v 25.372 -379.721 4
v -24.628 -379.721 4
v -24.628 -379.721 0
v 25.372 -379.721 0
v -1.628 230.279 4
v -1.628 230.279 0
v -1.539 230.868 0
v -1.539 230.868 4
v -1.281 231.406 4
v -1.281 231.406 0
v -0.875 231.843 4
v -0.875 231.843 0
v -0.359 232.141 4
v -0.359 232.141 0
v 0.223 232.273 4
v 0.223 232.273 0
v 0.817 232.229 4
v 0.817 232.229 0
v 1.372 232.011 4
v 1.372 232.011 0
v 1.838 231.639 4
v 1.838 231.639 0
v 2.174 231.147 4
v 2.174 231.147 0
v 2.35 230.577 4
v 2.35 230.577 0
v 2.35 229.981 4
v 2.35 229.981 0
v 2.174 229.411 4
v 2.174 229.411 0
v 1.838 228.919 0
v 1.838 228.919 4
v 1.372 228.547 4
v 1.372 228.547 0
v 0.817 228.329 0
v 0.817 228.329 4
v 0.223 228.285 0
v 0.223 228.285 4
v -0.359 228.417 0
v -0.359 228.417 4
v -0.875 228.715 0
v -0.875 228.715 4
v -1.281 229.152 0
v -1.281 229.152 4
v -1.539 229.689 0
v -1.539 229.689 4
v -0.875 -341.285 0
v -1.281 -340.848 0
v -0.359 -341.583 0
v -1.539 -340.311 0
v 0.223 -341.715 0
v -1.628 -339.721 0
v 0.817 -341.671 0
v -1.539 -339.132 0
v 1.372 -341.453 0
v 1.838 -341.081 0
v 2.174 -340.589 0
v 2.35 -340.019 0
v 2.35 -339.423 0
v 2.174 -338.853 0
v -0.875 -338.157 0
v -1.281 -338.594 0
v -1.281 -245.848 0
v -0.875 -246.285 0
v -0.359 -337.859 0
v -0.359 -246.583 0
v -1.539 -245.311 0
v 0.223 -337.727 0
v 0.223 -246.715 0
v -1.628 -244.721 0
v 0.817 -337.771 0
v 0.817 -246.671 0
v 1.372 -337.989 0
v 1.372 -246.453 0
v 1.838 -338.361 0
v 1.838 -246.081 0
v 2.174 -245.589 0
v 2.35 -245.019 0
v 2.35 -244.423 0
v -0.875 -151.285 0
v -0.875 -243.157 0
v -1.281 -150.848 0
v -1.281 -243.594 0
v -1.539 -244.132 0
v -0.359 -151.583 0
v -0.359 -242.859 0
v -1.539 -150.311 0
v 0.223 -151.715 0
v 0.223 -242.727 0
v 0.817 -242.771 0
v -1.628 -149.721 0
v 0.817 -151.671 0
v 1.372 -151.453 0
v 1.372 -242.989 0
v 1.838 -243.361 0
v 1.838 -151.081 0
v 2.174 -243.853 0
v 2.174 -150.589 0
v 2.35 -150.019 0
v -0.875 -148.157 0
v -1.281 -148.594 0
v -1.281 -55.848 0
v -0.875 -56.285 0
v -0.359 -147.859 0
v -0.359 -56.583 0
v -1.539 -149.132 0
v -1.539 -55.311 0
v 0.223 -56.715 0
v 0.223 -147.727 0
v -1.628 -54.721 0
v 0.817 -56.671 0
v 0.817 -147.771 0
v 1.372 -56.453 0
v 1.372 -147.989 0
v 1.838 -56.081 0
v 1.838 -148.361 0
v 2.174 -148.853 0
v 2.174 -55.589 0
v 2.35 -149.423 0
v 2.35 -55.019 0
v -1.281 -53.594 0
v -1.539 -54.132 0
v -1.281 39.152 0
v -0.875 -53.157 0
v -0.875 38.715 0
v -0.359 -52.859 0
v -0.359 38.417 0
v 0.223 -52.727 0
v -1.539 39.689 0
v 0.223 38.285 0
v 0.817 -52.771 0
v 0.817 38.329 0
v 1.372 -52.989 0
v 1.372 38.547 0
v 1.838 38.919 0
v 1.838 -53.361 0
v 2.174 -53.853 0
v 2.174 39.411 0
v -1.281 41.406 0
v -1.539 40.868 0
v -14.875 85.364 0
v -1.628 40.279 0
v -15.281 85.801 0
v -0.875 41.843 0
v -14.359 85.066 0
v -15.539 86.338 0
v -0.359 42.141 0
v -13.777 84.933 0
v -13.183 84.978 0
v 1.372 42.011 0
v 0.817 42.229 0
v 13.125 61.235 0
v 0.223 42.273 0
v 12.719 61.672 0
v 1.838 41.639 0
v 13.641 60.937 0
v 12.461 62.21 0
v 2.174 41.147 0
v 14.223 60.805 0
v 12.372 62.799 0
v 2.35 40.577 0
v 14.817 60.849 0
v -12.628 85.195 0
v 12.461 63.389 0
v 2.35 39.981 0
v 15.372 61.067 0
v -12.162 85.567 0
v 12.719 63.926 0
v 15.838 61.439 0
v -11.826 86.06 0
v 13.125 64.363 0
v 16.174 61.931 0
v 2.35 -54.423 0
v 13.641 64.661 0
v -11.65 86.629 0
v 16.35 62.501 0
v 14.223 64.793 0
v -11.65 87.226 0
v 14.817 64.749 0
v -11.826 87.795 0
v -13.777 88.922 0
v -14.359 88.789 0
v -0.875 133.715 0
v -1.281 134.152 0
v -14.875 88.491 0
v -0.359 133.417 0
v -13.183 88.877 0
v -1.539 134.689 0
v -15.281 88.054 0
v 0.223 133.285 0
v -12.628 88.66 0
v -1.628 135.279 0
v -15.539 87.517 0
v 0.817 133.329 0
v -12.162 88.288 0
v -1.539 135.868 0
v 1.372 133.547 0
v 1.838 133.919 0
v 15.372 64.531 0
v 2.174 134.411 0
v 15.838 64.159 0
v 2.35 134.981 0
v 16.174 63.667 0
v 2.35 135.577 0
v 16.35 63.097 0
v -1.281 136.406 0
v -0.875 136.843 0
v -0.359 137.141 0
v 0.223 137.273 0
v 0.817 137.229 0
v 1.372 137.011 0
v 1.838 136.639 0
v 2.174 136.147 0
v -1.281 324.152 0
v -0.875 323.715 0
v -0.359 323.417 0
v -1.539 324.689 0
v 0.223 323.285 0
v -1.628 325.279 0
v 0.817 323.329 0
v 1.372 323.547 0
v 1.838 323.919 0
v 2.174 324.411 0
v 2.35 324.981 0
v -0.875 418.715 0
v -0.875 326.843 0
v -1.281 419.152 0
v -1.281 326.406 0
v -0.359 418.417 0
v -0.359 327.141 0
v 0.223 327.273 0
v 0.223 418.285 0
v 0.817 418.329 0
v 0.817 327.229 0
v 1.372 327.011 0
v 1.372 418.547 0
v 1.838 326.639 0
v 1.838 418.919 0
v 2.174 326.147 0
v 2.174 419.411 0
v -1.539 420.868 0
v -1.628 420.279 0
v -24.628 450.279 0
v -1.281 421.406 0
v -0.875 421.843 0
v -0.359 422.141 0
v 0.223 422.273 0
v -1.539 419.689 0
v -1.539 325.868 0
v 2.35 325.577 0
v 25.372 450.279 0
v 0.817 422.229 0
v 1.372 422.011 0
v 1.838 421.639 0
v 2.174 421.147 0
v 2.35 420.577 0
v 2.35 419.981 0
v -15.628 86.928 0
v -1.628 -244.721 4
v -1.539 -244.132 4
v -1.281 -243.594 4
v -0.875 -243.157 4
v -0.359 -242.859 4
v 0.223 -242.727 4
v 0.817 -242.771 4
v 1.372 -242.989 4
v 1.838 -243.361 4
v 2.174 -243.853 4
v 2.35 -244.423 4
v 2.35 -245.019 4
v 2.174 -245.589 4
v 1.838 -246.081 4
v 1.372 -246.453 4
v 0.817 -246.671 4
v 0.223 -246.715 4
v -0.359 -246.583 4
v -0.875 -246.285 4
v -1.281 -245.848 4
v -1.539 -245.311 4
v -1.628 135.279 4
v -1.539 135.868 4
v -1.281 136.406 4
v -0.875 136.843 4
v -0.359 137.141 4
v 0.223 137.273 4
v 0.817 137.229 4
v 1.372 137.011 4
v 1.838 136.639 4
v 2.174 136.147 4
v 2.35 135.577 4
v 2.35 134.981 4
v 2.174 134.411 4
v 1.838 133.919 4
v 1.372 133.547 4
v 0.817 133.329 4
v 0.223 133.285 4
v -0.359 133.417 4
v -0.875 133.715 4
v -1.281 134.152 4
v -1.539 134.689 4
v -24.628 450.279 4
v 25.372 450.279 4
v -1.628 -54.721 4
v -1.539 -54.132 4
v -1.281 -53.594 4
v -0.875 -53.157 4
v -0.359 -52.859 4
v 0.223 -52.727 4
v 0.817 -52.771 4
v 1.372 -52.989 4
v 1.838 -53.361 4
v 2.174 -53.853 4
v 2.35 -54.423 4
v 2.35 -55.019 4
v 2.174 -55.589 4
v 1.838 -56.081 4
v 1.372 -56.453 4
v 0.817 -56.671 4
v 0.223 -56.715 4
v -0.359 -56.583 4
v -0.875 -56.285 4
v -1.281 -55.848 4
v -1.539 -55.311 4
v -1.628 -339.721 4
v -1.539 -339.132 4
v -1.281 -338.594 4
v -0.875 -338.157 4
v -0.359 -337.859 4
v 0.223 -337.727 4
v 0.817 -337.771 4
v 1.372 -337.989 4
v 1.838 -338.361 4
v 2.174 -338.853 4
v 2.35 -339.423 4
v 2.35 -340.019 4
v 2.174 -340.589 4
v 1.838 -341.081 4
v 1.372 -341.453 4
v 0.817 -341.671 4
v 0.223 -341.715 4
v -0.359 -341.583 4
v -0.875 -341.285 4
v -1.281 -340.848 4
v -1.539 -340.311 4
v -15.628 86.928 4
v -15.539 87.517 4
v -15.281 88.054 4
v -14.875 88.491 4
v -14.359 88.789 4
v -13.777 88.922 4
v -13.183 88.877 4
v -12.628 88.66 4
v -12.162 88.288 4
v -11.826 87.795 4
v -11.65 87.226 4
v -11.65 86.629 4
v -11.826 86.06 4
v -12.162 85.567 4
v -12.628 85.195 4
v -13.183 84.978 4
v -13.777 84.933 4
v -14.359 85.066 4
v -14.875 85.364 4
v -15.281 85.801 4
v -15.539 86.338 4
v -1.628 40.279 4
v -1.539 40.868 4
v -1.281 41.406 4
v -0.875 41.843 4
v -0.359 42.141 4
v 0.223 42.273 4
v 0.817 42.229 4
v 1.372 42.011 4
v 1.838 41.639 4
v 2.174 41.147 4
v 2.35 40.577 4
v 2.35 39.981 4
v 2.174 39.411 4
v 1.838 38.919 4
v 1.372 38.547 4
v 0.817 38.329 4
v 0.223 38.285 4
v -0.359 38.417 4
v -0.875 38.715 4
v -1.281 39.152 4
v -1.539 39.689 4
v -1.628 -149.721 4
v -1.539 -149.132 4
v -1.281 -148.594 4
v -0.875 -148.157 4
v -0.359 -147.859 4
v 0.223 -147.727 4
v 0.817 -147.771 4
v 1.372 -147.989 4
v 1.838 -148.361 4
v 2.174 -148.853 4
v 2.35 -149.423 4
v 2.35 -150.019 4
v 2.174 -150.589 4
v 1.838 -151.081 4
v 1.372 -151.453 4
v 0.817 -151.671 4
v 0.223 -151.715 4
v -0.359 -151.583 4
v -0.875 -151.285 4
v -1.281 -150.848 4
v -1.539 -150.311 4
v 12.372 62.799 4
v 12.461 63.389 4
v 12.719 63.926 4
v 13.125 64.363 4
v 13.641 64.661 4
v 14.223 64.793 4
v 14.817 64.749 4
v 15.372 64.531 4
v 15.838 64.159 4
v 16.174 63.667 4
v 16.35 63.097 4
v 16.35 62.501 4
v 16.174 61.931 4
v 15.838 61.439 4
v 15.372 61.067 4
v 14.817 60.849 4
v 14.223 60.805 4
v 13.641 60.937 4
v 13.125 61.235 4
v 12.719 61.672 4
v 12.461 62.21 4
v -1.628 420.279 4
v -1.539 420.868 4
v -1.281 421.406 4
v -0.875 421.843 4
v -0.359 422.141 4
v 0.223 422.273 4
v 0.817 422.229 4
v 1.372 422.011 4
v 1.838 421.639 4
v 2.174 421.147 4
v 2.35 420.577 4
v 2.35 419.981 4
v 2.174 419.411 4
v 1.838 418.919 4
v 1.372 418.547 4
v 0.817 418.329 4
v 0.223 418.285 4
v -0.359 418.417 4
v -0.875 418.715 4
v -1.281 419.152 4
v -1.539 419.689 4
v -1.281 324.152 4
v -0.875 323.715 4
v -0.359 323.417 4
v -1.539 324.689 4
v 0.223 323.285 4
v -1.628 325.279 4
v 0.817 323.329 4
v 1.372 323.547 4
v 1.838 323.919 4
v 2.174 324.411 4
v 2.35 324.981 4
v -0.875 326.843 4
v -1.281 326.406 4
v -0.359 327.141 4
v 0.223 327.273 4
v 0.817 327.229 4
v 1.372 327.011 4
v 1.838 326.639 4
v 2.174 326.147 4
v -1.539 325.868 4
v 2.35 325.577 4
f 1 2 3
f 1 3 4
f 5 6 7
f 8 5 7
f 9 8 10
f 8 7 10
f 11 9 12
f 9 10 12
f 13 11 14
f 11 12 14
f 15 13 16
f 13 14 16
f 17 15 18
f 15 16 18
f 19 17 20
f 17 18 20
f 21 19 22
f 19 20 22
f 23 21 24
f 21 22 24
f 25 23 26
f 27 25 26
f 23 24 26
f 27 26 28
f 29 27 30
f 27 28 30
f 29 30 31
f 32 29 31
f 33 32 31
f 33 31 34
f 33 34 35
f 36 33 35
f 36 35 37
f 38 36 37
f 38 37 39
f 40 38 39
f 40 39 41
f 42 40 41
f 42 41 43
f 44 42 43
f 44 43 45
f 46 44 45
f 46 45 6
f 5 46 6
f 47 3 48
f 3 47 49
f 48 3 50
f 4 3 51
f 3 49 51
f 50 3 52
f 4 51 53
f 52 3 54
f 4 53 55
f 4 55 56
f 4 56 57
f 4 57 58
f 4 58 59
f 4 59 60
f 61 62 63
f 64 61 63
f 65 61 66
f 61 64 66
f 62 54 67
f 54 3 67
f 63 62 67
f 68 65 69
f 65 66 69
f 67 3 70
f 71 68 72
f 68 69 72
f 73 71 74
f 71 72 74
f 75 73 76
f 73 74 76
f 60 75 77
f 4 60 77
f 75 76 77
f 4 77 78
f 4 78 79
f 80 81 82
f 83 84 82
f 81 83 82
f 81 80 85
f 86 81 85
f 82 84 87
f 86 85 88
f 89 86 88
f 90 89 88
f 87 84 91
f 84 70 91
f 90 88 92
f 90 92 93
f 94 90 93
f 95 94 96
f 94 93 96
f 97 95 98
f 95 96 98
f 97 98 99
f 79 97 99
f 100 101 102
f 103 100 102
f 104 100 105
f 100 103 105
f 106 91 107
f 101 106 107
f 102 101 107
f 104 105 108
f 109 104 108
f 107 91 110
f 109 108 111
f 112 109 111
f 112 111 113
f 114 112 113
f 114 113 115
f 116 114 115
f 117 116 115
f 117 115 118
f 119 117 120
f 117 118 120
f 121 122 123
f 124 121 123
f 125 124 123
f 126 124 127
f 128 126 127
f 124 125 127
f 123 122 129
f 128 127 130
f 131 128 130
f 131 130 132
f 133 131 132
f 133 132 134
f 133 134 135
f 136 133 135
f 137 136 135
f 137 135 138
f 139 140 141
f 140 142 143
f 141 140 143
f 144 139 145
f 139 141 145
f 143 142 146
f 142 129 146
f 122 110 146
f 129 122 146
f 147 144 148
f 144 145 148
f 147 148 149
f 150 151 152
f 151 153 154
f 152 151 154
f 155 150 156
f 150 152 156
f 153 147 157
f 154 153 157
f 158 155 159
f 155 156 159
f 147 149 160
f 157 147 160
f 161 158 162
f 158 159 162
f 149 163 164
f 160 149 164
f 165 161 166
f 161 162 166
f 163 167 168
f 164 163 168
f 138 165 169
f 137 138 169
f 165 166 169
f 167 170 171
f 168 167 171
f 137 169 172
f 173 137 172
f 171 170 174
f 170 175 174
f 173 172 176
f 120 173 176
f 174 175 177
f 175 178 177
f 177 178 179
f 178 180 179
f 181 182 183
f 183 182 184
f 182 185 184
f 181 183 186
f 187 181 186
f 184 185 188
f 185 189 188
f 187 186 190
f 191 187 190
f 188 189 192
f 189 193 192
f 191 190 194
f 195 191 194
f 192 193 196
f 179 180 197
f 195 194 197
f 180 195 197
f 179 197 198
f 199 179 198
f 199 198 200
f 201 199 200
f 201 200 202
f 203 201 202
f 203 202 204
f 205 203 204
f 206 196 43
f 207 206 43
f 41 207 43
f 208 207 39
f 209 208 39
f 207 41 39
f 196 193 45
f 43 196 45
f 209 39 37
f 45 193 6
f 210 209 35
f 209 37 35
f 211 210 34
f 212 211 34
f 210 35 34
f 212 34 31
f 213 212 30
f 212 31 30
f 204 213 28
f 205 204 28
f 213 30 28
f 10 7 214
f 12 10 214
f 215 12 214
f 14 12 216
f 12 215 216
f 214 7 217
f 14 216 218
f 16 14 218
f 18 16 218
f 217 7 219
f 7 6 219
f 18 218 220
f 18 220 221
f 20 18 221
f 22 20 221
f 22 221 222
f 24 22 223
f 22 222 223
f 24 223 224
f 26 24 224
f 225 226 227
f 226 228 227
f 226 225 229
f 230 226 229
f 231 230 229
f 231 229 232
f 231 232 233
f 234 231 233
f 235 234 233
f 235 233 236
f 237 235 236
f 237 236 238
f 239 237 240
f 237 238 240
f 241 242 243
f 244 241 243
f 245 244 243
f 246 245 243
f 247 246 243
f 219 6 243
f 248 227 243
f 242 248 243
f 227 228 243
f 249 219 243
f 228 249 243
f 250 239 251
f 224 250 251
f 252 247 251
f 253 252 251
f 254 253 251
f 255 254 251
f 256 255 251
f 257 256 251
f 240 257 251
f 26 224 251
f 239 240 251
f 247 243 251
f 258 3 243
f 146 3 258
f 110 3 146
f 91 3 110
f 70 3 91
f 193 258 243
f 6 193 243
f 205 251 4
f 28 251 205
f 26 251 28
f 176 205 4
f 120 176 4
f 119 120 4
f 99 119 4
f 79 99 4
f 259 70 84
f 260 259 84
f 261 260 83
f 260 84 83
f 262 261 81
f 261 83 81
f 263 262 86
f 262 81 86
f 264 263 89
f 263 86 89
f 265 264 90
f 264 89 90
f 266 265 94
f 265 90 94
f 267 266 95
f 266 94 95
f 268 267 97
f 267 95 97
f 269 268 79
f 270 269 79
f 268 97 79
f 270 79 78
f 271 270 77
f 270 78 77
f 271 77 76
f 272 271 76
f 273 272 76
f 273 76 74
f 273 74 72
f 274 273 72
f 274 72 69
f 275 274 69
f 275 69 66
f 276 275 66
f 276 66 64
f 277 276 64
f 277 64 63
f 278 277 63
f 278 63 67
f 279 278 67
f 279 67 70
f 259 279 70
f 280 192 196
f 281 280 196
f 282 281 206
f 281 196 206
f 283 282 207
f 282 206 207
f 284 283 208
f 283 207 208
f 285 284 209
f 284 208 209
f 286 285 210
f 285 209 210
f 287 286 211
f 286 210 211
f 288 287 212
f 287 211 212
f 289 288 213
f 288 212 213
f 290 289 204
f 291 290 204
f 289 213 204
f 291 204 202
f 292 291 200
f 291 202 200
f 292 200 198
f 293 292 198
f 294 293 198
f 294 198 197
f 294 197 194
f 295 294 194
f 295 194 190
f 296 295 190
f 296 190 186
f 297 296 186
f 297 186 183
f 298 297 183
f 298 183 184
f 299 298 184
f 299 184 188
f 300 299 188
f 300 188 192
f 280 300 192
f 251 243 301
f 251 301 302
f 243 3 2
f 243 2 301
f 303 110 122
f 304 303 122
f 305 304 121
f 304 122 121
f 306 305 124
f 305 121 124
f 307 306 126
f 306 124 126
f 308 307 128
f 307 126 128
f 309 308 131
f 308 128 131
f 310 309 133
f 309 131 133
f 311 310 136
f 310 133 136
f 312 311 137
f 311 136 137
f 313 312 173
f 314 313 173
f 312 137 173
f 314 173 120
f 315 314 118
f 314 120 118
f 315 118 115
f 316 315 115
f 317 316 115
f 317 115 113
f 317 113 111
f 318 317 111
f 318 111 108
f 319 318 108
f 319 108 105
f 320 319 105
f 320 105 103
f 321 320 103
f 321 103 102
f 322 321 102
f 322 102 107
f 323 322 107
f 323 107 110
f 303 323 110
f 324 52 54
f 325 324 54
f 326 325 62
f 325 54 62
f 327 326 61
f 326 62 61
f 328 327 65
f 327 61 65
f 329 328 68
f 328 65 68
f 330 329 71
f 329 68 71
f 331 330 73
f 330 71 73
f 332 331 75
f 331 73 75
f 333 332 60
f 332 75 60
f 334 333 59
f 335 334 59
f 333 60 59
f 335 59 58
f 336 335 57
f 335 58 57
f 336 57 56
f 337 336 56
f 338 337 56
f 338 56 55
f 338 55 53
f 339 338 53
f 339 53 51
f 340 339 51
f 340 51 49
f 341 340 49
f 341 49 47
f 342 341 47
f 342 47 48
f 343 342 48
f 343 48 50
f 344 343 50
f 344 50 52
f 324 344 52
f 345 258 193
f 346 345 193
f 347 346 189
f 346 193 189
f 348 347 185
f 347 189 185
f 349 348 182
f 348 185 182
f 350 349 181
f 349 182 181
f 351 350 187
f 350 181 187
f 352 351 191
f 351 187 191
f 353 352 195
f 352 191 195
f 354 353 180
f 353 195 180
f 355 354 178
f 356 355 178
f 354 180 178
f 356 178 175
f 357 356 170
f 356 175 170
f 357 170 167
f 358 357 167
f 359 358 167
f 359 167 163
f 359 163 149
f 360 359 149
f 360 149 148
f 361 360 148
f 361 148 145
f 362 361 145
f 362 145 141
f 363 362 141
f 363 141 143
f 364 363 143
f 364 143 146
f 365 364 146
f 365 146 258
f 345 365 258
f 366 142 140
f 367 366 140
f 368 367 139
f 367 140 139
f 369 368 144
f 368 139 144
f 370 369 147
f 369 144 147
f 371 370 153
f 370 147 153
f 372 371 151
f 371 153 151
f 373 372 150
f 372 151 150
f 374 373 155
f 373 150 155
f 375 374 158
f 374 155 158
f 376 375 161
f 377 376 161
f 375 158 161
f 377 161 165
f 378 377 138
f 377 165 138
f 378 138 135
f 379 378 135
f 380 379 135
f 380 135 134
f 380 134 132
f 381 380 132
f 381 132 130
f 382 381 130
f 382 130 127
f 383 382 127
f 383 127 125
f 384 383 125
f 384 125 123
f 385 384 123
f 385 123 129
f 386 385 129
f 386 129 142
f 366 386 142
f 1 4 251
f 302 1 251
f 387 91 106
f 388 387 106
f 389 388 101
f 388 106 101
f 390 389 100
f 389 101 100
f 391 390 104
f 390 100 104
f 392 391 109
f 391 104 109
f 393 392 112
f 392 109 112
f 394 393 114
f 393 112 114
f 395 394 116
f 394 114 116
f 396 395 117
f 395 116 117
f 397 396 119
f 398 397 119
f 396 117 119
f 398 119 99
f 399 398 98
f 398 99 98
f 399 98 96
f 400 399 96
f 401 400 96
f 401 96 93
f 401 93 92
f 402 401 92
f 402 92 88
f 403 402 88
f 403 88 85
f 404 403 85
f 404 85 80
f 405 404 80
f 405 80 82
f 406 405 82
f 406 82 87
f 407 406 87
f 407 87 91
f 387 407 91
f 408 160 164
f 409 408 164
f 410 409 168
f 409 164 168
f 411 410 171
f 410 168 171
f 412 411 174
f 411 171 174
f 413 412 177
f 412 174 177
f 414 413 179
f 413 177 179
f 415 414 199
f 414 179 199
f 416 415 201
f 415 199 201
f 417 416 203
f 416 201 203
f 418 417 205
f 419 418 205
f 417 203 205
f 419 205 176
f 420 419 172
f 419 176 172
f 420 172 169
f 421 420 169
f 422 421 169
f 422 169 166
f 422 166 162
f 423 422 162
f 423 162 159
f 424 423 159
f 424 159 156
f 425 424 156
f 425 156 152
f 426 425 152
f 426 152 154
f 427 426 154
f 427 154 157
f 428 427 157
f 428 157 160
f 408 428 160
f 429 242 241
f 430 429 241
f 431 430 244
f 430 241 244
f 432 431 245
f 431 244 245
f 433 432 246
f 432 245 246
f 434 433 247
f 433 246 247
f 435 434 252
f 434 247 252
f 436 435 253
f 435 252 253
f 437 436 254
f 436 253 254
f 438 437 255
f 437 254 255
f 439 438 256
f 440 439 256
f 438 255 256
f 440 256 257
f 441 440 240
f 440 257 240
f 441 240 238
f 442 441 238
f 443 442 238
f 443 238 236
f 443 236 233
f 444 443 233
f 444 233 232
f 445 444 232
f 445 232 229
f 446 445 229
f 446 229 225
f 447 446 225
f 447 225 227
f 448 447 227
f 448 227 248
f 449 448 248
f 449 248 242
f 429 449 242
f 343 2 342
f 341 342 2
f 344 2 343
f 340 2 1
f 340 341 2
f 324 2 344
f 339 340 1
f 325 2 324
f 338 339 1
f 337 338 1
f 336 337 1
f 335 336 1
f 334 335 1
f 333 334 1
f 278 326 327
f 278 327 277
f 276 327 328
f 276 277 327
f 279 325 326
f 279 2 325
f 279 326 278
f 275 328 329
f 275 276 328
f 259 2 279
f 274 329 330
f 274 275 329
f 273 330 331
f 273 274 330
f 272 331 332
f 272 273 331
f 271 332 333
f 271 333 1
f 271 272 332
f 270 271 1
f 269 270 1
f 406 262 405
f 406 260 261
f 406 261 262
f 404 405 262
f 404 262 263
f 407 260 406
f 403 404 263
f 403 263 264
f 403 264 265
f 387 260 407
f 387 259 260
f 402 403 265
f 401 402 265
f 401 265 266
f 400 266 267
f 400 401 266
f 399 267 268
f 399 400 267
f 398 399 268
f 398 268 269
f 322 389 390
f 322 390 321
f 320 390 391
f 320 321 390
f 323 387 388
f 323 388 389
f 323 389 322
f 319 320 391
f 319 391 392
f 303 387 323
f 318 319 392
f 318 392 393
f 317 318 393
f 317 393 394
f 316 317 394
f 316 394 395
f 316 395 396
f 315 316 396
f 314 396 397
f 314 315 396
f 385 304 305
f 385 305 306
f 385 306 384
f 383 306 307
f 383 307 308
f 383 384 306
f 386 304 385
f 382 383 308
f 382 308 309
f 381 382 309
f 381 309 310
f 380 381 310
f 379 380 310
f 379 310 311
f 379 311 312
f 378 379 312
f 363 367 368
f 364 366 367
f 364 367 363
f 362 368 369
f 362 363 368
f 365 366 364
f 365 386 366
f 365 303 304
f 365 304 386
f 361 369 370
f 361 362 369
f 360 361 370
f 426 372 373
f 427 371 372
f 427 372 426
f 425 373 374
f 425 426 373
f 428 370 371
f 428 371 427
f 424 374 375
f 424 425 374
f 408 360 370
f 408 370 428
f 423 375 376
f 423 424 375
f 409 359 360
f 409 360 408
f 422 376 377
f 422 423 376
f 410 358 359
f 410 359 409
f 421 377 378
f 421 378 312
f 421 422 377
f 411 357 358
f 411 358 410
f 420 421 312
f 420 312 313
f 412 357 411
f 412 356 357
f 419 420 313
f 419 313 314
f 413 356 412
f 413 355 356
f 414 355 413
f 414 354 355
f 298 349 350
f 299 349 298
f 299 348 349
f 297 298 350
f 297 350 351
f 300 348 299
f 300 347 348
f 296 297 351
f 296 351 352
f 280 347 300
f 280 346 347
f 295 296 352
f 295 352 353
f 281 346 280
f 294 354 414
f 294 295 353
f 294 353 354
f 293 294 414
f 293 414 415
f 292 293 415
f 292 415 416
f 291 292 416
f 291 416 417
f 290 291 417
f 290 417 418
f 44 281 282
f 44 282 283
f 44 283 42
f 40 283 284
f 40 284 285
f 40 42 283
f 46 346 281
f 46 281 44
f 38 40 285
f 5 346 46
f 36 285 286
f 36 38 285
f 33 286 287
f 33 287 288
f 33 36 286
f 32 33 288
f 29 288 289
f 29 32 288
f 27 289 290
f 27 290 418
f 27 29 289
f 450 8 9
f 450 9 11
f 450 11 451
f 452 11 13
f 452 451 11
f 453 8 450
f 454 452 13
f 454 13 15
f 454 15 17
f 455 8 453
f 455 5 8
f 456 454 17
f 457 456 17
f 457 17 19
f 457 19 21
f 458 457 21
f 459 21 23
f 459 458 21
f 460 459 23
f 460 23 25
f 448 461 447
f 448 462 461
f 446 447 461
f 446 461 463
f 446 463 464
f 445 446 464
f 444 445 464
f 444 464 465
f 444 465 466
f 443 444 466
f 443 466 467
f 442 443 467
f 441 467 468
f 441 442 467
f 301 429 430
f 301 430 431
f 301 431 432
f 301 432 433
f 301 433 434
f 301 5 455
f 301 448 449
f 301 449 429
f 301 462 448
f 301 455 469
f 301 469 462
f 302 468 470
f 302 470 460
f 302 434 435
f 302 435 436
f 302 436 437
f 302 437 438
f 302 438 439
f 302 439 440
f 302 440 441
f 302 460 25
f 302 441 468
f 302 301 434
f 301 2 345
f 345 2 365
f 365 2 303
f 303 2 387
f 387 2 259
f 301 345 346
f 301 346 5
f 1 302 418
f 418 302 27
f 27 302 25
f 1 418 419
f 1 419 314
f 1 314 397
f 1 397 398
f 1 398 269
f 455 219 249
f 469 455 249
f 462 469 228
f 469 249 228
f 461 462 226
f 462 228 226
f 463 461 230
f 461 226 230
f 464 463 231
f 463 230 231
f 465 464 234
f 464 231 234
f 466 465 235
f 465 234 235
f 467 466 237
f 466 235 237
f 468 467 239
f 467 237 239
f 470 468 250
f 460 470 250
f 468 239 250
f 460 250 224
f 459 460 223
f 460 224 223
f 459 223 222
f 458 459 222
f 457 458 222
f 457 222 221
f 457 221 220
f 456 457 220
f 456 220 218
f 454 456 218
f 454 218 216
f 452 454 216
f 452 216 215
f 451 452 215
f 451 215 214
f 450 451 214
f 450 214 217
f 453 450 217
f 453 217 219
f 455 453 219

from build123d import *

# Parameters (mm, degrees)
SKETCH2_W           = 50
SKETCH2_H           = 900
BOSS_EXTRUDE1_DEPTH = 4
CUT_EXTRUDE1_REACH  = 6
SKETCH3_W           = 50
SKETCH3_H           = 70
SKETCH4_R           = 2
CUT_EXTRUDE4_DEPTH  = 5


with BuildPart() as part:
    # Sketch2 → Boss-Extrude1 (new body)
    with BuildSketch(Plane.XY):
        with Locations((0.371961745, 0.278971309)):
            Rectangle(SKETCH2_W, SKETCH2_H)
    extrude(amount=BOSS_EXTRUDE1_DEPTH)

    # Sketch3 → Cut-Extrude1 (cut, up to next)
    with BuildSketch(Plane.XY.offset(4), mode=Mode.PRIVATE) as cut_extrude1_sk1:
        with Locations((0.371961745, -414.721028691)):
            Rectangle(SKETCH3_W, SKETCH3_H)
    cut_extrude1_tool1 = extrude(cut_extrude1_sk1.sketch, amount=-CUT_EXTRUDE1_REACH, mode=Mode.PRIVATE) & part.part
    add(cut_extrude1_tool1.solids().sort_by_distance((0.371962, -414.721029, 4))[0], mode=Mode.SUBTRACT)

    # Sketch4 → Cut-Extrude4 (cut, through all)
    with BuildSketch(Plane(origin=(0, 0, 0), x_dir=(-1, 0, 0), z_dir=(0, 0, -1))):
        with Locations((13.628038255, 86.927507875)):
            Circle(SKETCH4_R)
        with Locations((12.128038255, 485.278971308)):
            Circle(SKETCH4_R)
        with Locations((-0.371961745, 500.278971309)):
            Circle(SKETCH4_R)
        with Locations((-0.371961745, 470.278971308)):
            Circle(SKETCH4_R)
        with Locations((-0.371961745, -244.721028692)):
            Circle(SKETCH4_R)
        with Locations((-0.371961745, -149.721028692)):
            Circle(SKETCH4_R)
        with Locations((-0.371961745, -54.721028692)):
            Circle(SKETCH4_R)
        with Locations((-0.371961745, 40.278971308)):
            Circle(SKETCH4_R)
        with Locations((-0.371961745, 135.278971308)):
            Circle(SKETCH4_R)
        with Locations((-0.371961745, 230.278971308)):
            Circle(SKETCH4_R)
        with Locations((-0.371961745, 325.278971308)):
            Circle(SKETCH4_R)
        with Locations((-0.371961745, 420.278971308)):
            Circle(SKETCH4_R)
        with Locations((-0.371961745, -339.721028692)):
            Circle(SKETCH4_R)
        with Locations((-14.371961745, 62.799089294)):
            Circle(SKETCH4_R)
    extrude(amount=-CUT_EXTRUDE4_DEPTH, mode=Mode.SUBTRACT)


solid = part.part
